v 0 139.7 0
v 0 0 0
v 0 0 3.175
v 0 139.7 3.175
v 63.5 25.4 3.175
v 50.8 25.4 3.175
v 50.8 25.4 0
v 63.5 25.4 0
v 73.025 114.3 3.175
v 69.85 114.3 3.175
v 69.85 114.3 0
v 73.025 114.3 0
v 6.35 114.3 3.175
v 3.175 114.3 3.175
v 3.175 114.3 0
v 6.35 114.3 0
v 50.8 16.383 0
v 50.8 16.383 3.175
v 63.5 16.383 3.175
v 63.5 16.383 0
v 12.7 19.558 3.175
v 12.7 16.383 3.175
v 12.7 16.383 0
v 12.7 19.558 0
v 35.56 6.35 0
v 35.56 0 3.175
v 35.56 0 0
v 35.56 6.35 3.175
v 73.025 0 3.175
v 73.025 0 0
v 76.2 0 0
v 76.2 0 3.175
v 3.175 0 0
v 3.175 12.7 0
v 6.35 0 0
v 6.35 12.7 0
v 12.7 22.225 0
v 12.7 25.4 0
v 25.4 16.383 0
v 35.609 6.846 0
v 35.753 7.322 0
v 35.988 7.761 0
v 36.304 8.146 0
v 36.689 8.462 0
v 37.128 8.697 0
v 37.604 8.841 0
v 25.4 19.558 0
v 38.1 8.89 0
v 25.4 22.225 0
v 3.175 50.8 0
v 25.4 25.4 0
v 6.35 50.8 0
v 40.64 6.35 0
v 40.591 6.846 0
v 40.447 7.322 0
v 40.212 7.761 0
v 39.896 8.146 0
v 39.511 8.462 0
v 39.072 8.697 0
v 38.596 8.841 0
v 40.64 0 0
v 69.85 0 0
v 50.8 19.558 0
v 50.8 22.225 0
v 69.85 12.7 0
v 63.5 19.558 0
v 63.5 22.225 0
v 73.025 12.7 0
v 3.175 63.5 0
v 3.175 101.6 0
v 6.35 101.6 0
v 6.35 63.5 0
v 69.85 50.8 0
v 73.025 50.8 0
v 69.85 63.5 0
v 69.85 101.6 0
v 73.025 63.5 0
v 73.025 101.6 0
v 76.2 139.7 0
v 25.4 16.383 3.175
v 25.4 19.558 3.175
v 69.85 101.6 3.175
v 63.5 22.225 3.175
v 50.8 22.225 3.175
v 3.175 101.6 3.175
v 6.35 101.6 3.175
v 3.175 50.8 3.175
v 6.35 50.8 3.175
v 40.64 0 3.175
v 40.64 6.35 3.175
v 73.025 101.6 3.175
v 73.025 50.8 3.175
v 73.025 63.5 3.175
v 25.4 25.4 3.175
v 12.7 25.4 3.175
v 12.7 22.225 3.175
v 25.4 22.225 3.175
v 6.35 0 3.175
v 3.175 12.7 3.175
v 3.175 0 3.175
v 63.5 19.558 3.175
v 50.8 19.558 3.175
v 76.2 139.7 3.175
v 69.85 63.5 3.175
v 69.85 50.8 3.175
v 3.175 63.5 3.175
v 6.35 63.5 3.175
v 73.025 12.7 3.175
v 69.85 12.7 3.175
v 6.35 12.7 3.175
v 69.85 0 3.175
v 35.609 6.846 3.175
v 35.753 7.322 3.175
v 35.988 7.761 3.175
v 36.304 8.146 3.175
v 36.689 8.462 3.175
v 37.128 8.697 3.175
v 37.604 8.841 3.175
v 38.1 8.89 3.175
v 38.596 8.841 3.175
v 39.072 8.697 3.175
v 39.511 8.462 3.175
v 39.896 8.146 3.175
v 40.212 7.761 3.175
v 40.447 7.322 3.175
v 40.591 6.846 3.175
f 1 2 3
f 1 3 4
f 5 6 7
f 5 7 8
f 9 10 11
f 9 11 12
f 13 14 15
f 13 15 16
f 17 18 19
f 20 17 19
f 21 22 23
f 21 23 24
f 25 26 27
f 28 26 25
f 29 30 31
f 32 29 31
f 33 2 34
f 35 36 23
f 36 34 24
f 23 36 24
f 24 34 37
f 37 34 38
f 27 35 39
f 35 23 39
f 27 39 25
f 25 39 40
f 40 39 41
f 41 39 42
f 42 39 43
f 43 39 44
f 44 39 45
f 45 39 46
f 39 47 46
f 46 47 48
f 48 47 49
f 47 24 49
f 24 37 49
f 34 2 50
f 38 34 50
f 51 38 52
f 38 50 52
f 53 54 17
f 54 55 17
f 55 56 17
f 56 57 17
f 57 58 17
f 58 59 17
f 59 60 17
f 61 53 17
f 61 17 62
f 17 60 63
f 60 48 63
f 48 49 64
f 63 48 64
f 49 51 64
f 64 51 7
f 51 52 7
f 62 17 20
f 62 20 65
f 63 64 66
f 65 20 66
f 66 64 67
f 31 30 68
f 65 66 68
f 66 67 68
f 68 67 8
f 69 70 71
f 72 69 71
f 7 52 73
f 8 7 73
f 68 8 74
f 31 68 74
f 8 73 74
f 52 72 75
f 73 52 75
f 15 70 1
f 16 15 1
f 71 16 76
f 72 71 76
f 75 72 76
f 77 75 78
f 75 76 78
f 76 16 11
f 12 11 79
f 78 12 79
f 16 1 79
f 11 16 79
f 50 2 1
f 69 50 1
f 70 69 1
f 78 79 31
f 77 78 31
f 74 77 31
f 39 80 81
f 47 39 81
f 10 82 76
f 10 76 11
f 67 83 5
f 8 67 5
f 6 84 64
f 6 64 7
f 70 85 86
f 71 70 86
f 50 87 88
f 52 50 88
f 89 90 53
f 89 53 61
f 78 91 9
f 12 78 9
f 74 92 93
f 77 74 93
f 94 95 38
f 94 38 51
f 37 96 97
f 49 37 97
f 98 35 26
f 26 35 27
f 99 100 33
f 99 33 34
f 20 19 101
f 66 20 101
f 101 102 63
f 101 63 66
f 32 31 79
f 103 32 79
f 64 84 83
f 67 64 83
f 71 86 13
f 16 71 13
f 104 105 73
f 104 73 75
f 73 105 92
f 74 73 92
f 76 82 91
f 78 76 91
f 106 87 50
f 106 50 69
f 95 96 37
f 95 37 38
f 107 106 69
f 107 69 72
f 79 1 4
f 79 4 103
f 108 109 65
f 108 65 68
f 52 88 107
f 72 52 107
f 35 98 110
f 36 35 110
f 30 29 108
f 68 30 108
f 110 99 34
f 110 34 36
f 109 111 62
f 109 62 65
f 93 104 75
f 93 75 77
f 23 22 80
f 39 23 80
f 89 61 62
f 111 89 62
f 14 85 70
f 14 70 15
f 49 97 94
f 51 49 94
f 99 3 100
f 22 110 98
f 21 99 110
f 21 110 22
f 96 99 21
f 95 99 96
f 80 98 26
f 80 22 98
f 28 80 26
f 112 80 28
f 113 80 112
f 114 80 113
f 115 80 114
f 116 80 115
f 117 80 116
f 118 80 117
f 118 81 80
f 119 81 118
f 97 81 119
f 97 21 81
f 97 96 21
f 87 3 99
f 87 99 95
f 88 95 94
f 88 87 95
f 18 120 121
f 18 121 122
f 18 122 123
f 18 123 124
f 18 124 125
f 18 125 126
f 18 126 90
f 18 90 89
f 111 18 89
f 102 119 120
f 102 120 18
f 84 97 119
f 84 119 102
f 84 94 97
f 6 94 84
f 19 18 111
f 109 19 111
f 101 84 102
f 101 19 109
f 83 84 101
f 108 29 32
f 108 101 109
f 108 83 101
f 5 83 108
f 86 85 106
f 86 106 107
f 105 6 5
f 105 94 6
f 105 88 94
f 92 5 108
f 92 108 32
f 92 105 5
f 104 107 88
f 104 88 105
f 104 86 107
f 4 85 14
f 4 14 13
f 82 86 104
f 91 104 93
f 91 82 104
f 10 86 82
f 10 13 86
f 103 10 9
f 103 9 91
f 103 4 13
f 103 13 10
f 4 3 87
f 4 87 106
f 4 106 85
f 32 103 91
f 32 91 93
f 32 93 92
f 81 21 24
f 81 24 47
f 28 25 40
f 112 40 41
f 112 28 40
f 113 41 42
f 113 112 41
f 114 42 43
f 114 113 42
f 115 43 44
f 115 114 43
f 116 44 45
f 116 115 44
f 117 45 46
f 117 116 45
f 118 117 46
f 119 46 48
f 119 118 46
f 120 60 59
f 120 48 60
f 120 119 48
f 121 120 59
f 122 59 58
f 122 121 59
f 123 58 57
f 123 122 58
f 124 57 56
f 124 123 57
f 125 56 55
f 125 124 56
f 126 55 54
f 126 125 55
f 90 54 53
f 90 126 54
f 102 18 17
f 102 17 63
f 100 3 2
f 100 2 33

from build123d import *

# Parameters (mm, degrees)
SKETCH1_W            = 76.2
SKETCH1_H            = 139.7
EXTRUDE1_DEPTH       = 3.175
EXTRUDE2_DEPTH       = 4.175
SKETCH3_W            = 12.7
SKETCH3_H            = 3.175
EXTRUDE3_DEPTH       = 4.175
LPATTERN1_COUNT      = 2
LPATTERN1_PITCH      = 38.1
LPATTERN1_COUNT_DIR2 = 2
LPATTERN1_PITCH_DIR2 = 5.842
SKETCH4_W            = 3.175
SKETCH4_H            = 12.7
EXTRUDE4_DEPTH       = 4.175
LPATTERN2_COUNT      = 3
LPATTERN2_PITCH      = 50.8
LPATTERN2_COUNT_DIR2 = 2
LPATTERN2_PITCH_DIR2 = 66.675


with BuildPart() as part:
    # Sketch1 → Extrude1 (new body)
    with BuildSketch(Plane.XY):
        with Locations((38.1, 69.85)):
            Rectangle(SKETCH1_W, SKETCH1_H)
    extrude(amount=EXTRUDE1_DEPTH)

    # Sketch2 → Extrude2 (cut, through all)
    with BuildSketch(Plane.XY.offset(3.175)):
        with BuildLine():
            Line((40.64, 6.35), (40.64, -24.177687884))
            ThreePointArc((40.64, -24.177687884), (38.1, -26.717687884), (35.56, -24.177687884))
            Line((35.56, -24.177687884), (35.56, 6.35))
            ThreePointArc((35.56, 6.35), (38.1, 8.89), (40.64, 6.35))
        make_face()
    extrude(amount=-EXTRUDE2_DEPTH, mode=Mode.SUBTRACT)

    # Sketch3 → Extrude3 (cut, through all)
    with BuildSketch(Plane.XY.offset(3.175)):
        with Locations((19.05, 23.8125)):
            Rectangle(SKETCH3_W, SKETCH3_H)
    extrude3 = extrude(amount=-EXTRUDE3_DEPTH, mode=Mode.SUBTRACT)

    # LPattern1: Extrude3 2 × 2
    with Locations(*[(i * LPATTERN1_PITCH, -j * LPATTERN1_PITCH_DIR2, 0) for i in range(LPATTERN1_COUNT) for j in range(LPATTERN1_COUNT_DIR2) if (i, j) != (0, 0)]):
        add(extrude3, mode=Mode.SUBTRACT)

    # Sketch4 → Extrude4 (cut, through all)
    with BuildSketch(Plane.XY.offset(3.175)):
        with Locations((71.4375, 6.35)):
            Rectangle(SKETCH4_W, SKETCH4_H)
    extrude4 = extrude(amount=-EXTRUDE4_DEPTH, mode=Mode.SUBTRACT)

    # LPattern2: Extrude4 3 × 2
    with Locations(*[(-j * LPATTERN2_PITCH_DIR2, i * LPATTERN2_PITCH, 0) for i in range(LPATTERN2_COUNT) for j in range(LPATTERN2_COUNT_DIR2) if (i, j) != (0, 0)]):
        add(extrude4, mode=Mode.SUBTRACT)


solid = part.part
